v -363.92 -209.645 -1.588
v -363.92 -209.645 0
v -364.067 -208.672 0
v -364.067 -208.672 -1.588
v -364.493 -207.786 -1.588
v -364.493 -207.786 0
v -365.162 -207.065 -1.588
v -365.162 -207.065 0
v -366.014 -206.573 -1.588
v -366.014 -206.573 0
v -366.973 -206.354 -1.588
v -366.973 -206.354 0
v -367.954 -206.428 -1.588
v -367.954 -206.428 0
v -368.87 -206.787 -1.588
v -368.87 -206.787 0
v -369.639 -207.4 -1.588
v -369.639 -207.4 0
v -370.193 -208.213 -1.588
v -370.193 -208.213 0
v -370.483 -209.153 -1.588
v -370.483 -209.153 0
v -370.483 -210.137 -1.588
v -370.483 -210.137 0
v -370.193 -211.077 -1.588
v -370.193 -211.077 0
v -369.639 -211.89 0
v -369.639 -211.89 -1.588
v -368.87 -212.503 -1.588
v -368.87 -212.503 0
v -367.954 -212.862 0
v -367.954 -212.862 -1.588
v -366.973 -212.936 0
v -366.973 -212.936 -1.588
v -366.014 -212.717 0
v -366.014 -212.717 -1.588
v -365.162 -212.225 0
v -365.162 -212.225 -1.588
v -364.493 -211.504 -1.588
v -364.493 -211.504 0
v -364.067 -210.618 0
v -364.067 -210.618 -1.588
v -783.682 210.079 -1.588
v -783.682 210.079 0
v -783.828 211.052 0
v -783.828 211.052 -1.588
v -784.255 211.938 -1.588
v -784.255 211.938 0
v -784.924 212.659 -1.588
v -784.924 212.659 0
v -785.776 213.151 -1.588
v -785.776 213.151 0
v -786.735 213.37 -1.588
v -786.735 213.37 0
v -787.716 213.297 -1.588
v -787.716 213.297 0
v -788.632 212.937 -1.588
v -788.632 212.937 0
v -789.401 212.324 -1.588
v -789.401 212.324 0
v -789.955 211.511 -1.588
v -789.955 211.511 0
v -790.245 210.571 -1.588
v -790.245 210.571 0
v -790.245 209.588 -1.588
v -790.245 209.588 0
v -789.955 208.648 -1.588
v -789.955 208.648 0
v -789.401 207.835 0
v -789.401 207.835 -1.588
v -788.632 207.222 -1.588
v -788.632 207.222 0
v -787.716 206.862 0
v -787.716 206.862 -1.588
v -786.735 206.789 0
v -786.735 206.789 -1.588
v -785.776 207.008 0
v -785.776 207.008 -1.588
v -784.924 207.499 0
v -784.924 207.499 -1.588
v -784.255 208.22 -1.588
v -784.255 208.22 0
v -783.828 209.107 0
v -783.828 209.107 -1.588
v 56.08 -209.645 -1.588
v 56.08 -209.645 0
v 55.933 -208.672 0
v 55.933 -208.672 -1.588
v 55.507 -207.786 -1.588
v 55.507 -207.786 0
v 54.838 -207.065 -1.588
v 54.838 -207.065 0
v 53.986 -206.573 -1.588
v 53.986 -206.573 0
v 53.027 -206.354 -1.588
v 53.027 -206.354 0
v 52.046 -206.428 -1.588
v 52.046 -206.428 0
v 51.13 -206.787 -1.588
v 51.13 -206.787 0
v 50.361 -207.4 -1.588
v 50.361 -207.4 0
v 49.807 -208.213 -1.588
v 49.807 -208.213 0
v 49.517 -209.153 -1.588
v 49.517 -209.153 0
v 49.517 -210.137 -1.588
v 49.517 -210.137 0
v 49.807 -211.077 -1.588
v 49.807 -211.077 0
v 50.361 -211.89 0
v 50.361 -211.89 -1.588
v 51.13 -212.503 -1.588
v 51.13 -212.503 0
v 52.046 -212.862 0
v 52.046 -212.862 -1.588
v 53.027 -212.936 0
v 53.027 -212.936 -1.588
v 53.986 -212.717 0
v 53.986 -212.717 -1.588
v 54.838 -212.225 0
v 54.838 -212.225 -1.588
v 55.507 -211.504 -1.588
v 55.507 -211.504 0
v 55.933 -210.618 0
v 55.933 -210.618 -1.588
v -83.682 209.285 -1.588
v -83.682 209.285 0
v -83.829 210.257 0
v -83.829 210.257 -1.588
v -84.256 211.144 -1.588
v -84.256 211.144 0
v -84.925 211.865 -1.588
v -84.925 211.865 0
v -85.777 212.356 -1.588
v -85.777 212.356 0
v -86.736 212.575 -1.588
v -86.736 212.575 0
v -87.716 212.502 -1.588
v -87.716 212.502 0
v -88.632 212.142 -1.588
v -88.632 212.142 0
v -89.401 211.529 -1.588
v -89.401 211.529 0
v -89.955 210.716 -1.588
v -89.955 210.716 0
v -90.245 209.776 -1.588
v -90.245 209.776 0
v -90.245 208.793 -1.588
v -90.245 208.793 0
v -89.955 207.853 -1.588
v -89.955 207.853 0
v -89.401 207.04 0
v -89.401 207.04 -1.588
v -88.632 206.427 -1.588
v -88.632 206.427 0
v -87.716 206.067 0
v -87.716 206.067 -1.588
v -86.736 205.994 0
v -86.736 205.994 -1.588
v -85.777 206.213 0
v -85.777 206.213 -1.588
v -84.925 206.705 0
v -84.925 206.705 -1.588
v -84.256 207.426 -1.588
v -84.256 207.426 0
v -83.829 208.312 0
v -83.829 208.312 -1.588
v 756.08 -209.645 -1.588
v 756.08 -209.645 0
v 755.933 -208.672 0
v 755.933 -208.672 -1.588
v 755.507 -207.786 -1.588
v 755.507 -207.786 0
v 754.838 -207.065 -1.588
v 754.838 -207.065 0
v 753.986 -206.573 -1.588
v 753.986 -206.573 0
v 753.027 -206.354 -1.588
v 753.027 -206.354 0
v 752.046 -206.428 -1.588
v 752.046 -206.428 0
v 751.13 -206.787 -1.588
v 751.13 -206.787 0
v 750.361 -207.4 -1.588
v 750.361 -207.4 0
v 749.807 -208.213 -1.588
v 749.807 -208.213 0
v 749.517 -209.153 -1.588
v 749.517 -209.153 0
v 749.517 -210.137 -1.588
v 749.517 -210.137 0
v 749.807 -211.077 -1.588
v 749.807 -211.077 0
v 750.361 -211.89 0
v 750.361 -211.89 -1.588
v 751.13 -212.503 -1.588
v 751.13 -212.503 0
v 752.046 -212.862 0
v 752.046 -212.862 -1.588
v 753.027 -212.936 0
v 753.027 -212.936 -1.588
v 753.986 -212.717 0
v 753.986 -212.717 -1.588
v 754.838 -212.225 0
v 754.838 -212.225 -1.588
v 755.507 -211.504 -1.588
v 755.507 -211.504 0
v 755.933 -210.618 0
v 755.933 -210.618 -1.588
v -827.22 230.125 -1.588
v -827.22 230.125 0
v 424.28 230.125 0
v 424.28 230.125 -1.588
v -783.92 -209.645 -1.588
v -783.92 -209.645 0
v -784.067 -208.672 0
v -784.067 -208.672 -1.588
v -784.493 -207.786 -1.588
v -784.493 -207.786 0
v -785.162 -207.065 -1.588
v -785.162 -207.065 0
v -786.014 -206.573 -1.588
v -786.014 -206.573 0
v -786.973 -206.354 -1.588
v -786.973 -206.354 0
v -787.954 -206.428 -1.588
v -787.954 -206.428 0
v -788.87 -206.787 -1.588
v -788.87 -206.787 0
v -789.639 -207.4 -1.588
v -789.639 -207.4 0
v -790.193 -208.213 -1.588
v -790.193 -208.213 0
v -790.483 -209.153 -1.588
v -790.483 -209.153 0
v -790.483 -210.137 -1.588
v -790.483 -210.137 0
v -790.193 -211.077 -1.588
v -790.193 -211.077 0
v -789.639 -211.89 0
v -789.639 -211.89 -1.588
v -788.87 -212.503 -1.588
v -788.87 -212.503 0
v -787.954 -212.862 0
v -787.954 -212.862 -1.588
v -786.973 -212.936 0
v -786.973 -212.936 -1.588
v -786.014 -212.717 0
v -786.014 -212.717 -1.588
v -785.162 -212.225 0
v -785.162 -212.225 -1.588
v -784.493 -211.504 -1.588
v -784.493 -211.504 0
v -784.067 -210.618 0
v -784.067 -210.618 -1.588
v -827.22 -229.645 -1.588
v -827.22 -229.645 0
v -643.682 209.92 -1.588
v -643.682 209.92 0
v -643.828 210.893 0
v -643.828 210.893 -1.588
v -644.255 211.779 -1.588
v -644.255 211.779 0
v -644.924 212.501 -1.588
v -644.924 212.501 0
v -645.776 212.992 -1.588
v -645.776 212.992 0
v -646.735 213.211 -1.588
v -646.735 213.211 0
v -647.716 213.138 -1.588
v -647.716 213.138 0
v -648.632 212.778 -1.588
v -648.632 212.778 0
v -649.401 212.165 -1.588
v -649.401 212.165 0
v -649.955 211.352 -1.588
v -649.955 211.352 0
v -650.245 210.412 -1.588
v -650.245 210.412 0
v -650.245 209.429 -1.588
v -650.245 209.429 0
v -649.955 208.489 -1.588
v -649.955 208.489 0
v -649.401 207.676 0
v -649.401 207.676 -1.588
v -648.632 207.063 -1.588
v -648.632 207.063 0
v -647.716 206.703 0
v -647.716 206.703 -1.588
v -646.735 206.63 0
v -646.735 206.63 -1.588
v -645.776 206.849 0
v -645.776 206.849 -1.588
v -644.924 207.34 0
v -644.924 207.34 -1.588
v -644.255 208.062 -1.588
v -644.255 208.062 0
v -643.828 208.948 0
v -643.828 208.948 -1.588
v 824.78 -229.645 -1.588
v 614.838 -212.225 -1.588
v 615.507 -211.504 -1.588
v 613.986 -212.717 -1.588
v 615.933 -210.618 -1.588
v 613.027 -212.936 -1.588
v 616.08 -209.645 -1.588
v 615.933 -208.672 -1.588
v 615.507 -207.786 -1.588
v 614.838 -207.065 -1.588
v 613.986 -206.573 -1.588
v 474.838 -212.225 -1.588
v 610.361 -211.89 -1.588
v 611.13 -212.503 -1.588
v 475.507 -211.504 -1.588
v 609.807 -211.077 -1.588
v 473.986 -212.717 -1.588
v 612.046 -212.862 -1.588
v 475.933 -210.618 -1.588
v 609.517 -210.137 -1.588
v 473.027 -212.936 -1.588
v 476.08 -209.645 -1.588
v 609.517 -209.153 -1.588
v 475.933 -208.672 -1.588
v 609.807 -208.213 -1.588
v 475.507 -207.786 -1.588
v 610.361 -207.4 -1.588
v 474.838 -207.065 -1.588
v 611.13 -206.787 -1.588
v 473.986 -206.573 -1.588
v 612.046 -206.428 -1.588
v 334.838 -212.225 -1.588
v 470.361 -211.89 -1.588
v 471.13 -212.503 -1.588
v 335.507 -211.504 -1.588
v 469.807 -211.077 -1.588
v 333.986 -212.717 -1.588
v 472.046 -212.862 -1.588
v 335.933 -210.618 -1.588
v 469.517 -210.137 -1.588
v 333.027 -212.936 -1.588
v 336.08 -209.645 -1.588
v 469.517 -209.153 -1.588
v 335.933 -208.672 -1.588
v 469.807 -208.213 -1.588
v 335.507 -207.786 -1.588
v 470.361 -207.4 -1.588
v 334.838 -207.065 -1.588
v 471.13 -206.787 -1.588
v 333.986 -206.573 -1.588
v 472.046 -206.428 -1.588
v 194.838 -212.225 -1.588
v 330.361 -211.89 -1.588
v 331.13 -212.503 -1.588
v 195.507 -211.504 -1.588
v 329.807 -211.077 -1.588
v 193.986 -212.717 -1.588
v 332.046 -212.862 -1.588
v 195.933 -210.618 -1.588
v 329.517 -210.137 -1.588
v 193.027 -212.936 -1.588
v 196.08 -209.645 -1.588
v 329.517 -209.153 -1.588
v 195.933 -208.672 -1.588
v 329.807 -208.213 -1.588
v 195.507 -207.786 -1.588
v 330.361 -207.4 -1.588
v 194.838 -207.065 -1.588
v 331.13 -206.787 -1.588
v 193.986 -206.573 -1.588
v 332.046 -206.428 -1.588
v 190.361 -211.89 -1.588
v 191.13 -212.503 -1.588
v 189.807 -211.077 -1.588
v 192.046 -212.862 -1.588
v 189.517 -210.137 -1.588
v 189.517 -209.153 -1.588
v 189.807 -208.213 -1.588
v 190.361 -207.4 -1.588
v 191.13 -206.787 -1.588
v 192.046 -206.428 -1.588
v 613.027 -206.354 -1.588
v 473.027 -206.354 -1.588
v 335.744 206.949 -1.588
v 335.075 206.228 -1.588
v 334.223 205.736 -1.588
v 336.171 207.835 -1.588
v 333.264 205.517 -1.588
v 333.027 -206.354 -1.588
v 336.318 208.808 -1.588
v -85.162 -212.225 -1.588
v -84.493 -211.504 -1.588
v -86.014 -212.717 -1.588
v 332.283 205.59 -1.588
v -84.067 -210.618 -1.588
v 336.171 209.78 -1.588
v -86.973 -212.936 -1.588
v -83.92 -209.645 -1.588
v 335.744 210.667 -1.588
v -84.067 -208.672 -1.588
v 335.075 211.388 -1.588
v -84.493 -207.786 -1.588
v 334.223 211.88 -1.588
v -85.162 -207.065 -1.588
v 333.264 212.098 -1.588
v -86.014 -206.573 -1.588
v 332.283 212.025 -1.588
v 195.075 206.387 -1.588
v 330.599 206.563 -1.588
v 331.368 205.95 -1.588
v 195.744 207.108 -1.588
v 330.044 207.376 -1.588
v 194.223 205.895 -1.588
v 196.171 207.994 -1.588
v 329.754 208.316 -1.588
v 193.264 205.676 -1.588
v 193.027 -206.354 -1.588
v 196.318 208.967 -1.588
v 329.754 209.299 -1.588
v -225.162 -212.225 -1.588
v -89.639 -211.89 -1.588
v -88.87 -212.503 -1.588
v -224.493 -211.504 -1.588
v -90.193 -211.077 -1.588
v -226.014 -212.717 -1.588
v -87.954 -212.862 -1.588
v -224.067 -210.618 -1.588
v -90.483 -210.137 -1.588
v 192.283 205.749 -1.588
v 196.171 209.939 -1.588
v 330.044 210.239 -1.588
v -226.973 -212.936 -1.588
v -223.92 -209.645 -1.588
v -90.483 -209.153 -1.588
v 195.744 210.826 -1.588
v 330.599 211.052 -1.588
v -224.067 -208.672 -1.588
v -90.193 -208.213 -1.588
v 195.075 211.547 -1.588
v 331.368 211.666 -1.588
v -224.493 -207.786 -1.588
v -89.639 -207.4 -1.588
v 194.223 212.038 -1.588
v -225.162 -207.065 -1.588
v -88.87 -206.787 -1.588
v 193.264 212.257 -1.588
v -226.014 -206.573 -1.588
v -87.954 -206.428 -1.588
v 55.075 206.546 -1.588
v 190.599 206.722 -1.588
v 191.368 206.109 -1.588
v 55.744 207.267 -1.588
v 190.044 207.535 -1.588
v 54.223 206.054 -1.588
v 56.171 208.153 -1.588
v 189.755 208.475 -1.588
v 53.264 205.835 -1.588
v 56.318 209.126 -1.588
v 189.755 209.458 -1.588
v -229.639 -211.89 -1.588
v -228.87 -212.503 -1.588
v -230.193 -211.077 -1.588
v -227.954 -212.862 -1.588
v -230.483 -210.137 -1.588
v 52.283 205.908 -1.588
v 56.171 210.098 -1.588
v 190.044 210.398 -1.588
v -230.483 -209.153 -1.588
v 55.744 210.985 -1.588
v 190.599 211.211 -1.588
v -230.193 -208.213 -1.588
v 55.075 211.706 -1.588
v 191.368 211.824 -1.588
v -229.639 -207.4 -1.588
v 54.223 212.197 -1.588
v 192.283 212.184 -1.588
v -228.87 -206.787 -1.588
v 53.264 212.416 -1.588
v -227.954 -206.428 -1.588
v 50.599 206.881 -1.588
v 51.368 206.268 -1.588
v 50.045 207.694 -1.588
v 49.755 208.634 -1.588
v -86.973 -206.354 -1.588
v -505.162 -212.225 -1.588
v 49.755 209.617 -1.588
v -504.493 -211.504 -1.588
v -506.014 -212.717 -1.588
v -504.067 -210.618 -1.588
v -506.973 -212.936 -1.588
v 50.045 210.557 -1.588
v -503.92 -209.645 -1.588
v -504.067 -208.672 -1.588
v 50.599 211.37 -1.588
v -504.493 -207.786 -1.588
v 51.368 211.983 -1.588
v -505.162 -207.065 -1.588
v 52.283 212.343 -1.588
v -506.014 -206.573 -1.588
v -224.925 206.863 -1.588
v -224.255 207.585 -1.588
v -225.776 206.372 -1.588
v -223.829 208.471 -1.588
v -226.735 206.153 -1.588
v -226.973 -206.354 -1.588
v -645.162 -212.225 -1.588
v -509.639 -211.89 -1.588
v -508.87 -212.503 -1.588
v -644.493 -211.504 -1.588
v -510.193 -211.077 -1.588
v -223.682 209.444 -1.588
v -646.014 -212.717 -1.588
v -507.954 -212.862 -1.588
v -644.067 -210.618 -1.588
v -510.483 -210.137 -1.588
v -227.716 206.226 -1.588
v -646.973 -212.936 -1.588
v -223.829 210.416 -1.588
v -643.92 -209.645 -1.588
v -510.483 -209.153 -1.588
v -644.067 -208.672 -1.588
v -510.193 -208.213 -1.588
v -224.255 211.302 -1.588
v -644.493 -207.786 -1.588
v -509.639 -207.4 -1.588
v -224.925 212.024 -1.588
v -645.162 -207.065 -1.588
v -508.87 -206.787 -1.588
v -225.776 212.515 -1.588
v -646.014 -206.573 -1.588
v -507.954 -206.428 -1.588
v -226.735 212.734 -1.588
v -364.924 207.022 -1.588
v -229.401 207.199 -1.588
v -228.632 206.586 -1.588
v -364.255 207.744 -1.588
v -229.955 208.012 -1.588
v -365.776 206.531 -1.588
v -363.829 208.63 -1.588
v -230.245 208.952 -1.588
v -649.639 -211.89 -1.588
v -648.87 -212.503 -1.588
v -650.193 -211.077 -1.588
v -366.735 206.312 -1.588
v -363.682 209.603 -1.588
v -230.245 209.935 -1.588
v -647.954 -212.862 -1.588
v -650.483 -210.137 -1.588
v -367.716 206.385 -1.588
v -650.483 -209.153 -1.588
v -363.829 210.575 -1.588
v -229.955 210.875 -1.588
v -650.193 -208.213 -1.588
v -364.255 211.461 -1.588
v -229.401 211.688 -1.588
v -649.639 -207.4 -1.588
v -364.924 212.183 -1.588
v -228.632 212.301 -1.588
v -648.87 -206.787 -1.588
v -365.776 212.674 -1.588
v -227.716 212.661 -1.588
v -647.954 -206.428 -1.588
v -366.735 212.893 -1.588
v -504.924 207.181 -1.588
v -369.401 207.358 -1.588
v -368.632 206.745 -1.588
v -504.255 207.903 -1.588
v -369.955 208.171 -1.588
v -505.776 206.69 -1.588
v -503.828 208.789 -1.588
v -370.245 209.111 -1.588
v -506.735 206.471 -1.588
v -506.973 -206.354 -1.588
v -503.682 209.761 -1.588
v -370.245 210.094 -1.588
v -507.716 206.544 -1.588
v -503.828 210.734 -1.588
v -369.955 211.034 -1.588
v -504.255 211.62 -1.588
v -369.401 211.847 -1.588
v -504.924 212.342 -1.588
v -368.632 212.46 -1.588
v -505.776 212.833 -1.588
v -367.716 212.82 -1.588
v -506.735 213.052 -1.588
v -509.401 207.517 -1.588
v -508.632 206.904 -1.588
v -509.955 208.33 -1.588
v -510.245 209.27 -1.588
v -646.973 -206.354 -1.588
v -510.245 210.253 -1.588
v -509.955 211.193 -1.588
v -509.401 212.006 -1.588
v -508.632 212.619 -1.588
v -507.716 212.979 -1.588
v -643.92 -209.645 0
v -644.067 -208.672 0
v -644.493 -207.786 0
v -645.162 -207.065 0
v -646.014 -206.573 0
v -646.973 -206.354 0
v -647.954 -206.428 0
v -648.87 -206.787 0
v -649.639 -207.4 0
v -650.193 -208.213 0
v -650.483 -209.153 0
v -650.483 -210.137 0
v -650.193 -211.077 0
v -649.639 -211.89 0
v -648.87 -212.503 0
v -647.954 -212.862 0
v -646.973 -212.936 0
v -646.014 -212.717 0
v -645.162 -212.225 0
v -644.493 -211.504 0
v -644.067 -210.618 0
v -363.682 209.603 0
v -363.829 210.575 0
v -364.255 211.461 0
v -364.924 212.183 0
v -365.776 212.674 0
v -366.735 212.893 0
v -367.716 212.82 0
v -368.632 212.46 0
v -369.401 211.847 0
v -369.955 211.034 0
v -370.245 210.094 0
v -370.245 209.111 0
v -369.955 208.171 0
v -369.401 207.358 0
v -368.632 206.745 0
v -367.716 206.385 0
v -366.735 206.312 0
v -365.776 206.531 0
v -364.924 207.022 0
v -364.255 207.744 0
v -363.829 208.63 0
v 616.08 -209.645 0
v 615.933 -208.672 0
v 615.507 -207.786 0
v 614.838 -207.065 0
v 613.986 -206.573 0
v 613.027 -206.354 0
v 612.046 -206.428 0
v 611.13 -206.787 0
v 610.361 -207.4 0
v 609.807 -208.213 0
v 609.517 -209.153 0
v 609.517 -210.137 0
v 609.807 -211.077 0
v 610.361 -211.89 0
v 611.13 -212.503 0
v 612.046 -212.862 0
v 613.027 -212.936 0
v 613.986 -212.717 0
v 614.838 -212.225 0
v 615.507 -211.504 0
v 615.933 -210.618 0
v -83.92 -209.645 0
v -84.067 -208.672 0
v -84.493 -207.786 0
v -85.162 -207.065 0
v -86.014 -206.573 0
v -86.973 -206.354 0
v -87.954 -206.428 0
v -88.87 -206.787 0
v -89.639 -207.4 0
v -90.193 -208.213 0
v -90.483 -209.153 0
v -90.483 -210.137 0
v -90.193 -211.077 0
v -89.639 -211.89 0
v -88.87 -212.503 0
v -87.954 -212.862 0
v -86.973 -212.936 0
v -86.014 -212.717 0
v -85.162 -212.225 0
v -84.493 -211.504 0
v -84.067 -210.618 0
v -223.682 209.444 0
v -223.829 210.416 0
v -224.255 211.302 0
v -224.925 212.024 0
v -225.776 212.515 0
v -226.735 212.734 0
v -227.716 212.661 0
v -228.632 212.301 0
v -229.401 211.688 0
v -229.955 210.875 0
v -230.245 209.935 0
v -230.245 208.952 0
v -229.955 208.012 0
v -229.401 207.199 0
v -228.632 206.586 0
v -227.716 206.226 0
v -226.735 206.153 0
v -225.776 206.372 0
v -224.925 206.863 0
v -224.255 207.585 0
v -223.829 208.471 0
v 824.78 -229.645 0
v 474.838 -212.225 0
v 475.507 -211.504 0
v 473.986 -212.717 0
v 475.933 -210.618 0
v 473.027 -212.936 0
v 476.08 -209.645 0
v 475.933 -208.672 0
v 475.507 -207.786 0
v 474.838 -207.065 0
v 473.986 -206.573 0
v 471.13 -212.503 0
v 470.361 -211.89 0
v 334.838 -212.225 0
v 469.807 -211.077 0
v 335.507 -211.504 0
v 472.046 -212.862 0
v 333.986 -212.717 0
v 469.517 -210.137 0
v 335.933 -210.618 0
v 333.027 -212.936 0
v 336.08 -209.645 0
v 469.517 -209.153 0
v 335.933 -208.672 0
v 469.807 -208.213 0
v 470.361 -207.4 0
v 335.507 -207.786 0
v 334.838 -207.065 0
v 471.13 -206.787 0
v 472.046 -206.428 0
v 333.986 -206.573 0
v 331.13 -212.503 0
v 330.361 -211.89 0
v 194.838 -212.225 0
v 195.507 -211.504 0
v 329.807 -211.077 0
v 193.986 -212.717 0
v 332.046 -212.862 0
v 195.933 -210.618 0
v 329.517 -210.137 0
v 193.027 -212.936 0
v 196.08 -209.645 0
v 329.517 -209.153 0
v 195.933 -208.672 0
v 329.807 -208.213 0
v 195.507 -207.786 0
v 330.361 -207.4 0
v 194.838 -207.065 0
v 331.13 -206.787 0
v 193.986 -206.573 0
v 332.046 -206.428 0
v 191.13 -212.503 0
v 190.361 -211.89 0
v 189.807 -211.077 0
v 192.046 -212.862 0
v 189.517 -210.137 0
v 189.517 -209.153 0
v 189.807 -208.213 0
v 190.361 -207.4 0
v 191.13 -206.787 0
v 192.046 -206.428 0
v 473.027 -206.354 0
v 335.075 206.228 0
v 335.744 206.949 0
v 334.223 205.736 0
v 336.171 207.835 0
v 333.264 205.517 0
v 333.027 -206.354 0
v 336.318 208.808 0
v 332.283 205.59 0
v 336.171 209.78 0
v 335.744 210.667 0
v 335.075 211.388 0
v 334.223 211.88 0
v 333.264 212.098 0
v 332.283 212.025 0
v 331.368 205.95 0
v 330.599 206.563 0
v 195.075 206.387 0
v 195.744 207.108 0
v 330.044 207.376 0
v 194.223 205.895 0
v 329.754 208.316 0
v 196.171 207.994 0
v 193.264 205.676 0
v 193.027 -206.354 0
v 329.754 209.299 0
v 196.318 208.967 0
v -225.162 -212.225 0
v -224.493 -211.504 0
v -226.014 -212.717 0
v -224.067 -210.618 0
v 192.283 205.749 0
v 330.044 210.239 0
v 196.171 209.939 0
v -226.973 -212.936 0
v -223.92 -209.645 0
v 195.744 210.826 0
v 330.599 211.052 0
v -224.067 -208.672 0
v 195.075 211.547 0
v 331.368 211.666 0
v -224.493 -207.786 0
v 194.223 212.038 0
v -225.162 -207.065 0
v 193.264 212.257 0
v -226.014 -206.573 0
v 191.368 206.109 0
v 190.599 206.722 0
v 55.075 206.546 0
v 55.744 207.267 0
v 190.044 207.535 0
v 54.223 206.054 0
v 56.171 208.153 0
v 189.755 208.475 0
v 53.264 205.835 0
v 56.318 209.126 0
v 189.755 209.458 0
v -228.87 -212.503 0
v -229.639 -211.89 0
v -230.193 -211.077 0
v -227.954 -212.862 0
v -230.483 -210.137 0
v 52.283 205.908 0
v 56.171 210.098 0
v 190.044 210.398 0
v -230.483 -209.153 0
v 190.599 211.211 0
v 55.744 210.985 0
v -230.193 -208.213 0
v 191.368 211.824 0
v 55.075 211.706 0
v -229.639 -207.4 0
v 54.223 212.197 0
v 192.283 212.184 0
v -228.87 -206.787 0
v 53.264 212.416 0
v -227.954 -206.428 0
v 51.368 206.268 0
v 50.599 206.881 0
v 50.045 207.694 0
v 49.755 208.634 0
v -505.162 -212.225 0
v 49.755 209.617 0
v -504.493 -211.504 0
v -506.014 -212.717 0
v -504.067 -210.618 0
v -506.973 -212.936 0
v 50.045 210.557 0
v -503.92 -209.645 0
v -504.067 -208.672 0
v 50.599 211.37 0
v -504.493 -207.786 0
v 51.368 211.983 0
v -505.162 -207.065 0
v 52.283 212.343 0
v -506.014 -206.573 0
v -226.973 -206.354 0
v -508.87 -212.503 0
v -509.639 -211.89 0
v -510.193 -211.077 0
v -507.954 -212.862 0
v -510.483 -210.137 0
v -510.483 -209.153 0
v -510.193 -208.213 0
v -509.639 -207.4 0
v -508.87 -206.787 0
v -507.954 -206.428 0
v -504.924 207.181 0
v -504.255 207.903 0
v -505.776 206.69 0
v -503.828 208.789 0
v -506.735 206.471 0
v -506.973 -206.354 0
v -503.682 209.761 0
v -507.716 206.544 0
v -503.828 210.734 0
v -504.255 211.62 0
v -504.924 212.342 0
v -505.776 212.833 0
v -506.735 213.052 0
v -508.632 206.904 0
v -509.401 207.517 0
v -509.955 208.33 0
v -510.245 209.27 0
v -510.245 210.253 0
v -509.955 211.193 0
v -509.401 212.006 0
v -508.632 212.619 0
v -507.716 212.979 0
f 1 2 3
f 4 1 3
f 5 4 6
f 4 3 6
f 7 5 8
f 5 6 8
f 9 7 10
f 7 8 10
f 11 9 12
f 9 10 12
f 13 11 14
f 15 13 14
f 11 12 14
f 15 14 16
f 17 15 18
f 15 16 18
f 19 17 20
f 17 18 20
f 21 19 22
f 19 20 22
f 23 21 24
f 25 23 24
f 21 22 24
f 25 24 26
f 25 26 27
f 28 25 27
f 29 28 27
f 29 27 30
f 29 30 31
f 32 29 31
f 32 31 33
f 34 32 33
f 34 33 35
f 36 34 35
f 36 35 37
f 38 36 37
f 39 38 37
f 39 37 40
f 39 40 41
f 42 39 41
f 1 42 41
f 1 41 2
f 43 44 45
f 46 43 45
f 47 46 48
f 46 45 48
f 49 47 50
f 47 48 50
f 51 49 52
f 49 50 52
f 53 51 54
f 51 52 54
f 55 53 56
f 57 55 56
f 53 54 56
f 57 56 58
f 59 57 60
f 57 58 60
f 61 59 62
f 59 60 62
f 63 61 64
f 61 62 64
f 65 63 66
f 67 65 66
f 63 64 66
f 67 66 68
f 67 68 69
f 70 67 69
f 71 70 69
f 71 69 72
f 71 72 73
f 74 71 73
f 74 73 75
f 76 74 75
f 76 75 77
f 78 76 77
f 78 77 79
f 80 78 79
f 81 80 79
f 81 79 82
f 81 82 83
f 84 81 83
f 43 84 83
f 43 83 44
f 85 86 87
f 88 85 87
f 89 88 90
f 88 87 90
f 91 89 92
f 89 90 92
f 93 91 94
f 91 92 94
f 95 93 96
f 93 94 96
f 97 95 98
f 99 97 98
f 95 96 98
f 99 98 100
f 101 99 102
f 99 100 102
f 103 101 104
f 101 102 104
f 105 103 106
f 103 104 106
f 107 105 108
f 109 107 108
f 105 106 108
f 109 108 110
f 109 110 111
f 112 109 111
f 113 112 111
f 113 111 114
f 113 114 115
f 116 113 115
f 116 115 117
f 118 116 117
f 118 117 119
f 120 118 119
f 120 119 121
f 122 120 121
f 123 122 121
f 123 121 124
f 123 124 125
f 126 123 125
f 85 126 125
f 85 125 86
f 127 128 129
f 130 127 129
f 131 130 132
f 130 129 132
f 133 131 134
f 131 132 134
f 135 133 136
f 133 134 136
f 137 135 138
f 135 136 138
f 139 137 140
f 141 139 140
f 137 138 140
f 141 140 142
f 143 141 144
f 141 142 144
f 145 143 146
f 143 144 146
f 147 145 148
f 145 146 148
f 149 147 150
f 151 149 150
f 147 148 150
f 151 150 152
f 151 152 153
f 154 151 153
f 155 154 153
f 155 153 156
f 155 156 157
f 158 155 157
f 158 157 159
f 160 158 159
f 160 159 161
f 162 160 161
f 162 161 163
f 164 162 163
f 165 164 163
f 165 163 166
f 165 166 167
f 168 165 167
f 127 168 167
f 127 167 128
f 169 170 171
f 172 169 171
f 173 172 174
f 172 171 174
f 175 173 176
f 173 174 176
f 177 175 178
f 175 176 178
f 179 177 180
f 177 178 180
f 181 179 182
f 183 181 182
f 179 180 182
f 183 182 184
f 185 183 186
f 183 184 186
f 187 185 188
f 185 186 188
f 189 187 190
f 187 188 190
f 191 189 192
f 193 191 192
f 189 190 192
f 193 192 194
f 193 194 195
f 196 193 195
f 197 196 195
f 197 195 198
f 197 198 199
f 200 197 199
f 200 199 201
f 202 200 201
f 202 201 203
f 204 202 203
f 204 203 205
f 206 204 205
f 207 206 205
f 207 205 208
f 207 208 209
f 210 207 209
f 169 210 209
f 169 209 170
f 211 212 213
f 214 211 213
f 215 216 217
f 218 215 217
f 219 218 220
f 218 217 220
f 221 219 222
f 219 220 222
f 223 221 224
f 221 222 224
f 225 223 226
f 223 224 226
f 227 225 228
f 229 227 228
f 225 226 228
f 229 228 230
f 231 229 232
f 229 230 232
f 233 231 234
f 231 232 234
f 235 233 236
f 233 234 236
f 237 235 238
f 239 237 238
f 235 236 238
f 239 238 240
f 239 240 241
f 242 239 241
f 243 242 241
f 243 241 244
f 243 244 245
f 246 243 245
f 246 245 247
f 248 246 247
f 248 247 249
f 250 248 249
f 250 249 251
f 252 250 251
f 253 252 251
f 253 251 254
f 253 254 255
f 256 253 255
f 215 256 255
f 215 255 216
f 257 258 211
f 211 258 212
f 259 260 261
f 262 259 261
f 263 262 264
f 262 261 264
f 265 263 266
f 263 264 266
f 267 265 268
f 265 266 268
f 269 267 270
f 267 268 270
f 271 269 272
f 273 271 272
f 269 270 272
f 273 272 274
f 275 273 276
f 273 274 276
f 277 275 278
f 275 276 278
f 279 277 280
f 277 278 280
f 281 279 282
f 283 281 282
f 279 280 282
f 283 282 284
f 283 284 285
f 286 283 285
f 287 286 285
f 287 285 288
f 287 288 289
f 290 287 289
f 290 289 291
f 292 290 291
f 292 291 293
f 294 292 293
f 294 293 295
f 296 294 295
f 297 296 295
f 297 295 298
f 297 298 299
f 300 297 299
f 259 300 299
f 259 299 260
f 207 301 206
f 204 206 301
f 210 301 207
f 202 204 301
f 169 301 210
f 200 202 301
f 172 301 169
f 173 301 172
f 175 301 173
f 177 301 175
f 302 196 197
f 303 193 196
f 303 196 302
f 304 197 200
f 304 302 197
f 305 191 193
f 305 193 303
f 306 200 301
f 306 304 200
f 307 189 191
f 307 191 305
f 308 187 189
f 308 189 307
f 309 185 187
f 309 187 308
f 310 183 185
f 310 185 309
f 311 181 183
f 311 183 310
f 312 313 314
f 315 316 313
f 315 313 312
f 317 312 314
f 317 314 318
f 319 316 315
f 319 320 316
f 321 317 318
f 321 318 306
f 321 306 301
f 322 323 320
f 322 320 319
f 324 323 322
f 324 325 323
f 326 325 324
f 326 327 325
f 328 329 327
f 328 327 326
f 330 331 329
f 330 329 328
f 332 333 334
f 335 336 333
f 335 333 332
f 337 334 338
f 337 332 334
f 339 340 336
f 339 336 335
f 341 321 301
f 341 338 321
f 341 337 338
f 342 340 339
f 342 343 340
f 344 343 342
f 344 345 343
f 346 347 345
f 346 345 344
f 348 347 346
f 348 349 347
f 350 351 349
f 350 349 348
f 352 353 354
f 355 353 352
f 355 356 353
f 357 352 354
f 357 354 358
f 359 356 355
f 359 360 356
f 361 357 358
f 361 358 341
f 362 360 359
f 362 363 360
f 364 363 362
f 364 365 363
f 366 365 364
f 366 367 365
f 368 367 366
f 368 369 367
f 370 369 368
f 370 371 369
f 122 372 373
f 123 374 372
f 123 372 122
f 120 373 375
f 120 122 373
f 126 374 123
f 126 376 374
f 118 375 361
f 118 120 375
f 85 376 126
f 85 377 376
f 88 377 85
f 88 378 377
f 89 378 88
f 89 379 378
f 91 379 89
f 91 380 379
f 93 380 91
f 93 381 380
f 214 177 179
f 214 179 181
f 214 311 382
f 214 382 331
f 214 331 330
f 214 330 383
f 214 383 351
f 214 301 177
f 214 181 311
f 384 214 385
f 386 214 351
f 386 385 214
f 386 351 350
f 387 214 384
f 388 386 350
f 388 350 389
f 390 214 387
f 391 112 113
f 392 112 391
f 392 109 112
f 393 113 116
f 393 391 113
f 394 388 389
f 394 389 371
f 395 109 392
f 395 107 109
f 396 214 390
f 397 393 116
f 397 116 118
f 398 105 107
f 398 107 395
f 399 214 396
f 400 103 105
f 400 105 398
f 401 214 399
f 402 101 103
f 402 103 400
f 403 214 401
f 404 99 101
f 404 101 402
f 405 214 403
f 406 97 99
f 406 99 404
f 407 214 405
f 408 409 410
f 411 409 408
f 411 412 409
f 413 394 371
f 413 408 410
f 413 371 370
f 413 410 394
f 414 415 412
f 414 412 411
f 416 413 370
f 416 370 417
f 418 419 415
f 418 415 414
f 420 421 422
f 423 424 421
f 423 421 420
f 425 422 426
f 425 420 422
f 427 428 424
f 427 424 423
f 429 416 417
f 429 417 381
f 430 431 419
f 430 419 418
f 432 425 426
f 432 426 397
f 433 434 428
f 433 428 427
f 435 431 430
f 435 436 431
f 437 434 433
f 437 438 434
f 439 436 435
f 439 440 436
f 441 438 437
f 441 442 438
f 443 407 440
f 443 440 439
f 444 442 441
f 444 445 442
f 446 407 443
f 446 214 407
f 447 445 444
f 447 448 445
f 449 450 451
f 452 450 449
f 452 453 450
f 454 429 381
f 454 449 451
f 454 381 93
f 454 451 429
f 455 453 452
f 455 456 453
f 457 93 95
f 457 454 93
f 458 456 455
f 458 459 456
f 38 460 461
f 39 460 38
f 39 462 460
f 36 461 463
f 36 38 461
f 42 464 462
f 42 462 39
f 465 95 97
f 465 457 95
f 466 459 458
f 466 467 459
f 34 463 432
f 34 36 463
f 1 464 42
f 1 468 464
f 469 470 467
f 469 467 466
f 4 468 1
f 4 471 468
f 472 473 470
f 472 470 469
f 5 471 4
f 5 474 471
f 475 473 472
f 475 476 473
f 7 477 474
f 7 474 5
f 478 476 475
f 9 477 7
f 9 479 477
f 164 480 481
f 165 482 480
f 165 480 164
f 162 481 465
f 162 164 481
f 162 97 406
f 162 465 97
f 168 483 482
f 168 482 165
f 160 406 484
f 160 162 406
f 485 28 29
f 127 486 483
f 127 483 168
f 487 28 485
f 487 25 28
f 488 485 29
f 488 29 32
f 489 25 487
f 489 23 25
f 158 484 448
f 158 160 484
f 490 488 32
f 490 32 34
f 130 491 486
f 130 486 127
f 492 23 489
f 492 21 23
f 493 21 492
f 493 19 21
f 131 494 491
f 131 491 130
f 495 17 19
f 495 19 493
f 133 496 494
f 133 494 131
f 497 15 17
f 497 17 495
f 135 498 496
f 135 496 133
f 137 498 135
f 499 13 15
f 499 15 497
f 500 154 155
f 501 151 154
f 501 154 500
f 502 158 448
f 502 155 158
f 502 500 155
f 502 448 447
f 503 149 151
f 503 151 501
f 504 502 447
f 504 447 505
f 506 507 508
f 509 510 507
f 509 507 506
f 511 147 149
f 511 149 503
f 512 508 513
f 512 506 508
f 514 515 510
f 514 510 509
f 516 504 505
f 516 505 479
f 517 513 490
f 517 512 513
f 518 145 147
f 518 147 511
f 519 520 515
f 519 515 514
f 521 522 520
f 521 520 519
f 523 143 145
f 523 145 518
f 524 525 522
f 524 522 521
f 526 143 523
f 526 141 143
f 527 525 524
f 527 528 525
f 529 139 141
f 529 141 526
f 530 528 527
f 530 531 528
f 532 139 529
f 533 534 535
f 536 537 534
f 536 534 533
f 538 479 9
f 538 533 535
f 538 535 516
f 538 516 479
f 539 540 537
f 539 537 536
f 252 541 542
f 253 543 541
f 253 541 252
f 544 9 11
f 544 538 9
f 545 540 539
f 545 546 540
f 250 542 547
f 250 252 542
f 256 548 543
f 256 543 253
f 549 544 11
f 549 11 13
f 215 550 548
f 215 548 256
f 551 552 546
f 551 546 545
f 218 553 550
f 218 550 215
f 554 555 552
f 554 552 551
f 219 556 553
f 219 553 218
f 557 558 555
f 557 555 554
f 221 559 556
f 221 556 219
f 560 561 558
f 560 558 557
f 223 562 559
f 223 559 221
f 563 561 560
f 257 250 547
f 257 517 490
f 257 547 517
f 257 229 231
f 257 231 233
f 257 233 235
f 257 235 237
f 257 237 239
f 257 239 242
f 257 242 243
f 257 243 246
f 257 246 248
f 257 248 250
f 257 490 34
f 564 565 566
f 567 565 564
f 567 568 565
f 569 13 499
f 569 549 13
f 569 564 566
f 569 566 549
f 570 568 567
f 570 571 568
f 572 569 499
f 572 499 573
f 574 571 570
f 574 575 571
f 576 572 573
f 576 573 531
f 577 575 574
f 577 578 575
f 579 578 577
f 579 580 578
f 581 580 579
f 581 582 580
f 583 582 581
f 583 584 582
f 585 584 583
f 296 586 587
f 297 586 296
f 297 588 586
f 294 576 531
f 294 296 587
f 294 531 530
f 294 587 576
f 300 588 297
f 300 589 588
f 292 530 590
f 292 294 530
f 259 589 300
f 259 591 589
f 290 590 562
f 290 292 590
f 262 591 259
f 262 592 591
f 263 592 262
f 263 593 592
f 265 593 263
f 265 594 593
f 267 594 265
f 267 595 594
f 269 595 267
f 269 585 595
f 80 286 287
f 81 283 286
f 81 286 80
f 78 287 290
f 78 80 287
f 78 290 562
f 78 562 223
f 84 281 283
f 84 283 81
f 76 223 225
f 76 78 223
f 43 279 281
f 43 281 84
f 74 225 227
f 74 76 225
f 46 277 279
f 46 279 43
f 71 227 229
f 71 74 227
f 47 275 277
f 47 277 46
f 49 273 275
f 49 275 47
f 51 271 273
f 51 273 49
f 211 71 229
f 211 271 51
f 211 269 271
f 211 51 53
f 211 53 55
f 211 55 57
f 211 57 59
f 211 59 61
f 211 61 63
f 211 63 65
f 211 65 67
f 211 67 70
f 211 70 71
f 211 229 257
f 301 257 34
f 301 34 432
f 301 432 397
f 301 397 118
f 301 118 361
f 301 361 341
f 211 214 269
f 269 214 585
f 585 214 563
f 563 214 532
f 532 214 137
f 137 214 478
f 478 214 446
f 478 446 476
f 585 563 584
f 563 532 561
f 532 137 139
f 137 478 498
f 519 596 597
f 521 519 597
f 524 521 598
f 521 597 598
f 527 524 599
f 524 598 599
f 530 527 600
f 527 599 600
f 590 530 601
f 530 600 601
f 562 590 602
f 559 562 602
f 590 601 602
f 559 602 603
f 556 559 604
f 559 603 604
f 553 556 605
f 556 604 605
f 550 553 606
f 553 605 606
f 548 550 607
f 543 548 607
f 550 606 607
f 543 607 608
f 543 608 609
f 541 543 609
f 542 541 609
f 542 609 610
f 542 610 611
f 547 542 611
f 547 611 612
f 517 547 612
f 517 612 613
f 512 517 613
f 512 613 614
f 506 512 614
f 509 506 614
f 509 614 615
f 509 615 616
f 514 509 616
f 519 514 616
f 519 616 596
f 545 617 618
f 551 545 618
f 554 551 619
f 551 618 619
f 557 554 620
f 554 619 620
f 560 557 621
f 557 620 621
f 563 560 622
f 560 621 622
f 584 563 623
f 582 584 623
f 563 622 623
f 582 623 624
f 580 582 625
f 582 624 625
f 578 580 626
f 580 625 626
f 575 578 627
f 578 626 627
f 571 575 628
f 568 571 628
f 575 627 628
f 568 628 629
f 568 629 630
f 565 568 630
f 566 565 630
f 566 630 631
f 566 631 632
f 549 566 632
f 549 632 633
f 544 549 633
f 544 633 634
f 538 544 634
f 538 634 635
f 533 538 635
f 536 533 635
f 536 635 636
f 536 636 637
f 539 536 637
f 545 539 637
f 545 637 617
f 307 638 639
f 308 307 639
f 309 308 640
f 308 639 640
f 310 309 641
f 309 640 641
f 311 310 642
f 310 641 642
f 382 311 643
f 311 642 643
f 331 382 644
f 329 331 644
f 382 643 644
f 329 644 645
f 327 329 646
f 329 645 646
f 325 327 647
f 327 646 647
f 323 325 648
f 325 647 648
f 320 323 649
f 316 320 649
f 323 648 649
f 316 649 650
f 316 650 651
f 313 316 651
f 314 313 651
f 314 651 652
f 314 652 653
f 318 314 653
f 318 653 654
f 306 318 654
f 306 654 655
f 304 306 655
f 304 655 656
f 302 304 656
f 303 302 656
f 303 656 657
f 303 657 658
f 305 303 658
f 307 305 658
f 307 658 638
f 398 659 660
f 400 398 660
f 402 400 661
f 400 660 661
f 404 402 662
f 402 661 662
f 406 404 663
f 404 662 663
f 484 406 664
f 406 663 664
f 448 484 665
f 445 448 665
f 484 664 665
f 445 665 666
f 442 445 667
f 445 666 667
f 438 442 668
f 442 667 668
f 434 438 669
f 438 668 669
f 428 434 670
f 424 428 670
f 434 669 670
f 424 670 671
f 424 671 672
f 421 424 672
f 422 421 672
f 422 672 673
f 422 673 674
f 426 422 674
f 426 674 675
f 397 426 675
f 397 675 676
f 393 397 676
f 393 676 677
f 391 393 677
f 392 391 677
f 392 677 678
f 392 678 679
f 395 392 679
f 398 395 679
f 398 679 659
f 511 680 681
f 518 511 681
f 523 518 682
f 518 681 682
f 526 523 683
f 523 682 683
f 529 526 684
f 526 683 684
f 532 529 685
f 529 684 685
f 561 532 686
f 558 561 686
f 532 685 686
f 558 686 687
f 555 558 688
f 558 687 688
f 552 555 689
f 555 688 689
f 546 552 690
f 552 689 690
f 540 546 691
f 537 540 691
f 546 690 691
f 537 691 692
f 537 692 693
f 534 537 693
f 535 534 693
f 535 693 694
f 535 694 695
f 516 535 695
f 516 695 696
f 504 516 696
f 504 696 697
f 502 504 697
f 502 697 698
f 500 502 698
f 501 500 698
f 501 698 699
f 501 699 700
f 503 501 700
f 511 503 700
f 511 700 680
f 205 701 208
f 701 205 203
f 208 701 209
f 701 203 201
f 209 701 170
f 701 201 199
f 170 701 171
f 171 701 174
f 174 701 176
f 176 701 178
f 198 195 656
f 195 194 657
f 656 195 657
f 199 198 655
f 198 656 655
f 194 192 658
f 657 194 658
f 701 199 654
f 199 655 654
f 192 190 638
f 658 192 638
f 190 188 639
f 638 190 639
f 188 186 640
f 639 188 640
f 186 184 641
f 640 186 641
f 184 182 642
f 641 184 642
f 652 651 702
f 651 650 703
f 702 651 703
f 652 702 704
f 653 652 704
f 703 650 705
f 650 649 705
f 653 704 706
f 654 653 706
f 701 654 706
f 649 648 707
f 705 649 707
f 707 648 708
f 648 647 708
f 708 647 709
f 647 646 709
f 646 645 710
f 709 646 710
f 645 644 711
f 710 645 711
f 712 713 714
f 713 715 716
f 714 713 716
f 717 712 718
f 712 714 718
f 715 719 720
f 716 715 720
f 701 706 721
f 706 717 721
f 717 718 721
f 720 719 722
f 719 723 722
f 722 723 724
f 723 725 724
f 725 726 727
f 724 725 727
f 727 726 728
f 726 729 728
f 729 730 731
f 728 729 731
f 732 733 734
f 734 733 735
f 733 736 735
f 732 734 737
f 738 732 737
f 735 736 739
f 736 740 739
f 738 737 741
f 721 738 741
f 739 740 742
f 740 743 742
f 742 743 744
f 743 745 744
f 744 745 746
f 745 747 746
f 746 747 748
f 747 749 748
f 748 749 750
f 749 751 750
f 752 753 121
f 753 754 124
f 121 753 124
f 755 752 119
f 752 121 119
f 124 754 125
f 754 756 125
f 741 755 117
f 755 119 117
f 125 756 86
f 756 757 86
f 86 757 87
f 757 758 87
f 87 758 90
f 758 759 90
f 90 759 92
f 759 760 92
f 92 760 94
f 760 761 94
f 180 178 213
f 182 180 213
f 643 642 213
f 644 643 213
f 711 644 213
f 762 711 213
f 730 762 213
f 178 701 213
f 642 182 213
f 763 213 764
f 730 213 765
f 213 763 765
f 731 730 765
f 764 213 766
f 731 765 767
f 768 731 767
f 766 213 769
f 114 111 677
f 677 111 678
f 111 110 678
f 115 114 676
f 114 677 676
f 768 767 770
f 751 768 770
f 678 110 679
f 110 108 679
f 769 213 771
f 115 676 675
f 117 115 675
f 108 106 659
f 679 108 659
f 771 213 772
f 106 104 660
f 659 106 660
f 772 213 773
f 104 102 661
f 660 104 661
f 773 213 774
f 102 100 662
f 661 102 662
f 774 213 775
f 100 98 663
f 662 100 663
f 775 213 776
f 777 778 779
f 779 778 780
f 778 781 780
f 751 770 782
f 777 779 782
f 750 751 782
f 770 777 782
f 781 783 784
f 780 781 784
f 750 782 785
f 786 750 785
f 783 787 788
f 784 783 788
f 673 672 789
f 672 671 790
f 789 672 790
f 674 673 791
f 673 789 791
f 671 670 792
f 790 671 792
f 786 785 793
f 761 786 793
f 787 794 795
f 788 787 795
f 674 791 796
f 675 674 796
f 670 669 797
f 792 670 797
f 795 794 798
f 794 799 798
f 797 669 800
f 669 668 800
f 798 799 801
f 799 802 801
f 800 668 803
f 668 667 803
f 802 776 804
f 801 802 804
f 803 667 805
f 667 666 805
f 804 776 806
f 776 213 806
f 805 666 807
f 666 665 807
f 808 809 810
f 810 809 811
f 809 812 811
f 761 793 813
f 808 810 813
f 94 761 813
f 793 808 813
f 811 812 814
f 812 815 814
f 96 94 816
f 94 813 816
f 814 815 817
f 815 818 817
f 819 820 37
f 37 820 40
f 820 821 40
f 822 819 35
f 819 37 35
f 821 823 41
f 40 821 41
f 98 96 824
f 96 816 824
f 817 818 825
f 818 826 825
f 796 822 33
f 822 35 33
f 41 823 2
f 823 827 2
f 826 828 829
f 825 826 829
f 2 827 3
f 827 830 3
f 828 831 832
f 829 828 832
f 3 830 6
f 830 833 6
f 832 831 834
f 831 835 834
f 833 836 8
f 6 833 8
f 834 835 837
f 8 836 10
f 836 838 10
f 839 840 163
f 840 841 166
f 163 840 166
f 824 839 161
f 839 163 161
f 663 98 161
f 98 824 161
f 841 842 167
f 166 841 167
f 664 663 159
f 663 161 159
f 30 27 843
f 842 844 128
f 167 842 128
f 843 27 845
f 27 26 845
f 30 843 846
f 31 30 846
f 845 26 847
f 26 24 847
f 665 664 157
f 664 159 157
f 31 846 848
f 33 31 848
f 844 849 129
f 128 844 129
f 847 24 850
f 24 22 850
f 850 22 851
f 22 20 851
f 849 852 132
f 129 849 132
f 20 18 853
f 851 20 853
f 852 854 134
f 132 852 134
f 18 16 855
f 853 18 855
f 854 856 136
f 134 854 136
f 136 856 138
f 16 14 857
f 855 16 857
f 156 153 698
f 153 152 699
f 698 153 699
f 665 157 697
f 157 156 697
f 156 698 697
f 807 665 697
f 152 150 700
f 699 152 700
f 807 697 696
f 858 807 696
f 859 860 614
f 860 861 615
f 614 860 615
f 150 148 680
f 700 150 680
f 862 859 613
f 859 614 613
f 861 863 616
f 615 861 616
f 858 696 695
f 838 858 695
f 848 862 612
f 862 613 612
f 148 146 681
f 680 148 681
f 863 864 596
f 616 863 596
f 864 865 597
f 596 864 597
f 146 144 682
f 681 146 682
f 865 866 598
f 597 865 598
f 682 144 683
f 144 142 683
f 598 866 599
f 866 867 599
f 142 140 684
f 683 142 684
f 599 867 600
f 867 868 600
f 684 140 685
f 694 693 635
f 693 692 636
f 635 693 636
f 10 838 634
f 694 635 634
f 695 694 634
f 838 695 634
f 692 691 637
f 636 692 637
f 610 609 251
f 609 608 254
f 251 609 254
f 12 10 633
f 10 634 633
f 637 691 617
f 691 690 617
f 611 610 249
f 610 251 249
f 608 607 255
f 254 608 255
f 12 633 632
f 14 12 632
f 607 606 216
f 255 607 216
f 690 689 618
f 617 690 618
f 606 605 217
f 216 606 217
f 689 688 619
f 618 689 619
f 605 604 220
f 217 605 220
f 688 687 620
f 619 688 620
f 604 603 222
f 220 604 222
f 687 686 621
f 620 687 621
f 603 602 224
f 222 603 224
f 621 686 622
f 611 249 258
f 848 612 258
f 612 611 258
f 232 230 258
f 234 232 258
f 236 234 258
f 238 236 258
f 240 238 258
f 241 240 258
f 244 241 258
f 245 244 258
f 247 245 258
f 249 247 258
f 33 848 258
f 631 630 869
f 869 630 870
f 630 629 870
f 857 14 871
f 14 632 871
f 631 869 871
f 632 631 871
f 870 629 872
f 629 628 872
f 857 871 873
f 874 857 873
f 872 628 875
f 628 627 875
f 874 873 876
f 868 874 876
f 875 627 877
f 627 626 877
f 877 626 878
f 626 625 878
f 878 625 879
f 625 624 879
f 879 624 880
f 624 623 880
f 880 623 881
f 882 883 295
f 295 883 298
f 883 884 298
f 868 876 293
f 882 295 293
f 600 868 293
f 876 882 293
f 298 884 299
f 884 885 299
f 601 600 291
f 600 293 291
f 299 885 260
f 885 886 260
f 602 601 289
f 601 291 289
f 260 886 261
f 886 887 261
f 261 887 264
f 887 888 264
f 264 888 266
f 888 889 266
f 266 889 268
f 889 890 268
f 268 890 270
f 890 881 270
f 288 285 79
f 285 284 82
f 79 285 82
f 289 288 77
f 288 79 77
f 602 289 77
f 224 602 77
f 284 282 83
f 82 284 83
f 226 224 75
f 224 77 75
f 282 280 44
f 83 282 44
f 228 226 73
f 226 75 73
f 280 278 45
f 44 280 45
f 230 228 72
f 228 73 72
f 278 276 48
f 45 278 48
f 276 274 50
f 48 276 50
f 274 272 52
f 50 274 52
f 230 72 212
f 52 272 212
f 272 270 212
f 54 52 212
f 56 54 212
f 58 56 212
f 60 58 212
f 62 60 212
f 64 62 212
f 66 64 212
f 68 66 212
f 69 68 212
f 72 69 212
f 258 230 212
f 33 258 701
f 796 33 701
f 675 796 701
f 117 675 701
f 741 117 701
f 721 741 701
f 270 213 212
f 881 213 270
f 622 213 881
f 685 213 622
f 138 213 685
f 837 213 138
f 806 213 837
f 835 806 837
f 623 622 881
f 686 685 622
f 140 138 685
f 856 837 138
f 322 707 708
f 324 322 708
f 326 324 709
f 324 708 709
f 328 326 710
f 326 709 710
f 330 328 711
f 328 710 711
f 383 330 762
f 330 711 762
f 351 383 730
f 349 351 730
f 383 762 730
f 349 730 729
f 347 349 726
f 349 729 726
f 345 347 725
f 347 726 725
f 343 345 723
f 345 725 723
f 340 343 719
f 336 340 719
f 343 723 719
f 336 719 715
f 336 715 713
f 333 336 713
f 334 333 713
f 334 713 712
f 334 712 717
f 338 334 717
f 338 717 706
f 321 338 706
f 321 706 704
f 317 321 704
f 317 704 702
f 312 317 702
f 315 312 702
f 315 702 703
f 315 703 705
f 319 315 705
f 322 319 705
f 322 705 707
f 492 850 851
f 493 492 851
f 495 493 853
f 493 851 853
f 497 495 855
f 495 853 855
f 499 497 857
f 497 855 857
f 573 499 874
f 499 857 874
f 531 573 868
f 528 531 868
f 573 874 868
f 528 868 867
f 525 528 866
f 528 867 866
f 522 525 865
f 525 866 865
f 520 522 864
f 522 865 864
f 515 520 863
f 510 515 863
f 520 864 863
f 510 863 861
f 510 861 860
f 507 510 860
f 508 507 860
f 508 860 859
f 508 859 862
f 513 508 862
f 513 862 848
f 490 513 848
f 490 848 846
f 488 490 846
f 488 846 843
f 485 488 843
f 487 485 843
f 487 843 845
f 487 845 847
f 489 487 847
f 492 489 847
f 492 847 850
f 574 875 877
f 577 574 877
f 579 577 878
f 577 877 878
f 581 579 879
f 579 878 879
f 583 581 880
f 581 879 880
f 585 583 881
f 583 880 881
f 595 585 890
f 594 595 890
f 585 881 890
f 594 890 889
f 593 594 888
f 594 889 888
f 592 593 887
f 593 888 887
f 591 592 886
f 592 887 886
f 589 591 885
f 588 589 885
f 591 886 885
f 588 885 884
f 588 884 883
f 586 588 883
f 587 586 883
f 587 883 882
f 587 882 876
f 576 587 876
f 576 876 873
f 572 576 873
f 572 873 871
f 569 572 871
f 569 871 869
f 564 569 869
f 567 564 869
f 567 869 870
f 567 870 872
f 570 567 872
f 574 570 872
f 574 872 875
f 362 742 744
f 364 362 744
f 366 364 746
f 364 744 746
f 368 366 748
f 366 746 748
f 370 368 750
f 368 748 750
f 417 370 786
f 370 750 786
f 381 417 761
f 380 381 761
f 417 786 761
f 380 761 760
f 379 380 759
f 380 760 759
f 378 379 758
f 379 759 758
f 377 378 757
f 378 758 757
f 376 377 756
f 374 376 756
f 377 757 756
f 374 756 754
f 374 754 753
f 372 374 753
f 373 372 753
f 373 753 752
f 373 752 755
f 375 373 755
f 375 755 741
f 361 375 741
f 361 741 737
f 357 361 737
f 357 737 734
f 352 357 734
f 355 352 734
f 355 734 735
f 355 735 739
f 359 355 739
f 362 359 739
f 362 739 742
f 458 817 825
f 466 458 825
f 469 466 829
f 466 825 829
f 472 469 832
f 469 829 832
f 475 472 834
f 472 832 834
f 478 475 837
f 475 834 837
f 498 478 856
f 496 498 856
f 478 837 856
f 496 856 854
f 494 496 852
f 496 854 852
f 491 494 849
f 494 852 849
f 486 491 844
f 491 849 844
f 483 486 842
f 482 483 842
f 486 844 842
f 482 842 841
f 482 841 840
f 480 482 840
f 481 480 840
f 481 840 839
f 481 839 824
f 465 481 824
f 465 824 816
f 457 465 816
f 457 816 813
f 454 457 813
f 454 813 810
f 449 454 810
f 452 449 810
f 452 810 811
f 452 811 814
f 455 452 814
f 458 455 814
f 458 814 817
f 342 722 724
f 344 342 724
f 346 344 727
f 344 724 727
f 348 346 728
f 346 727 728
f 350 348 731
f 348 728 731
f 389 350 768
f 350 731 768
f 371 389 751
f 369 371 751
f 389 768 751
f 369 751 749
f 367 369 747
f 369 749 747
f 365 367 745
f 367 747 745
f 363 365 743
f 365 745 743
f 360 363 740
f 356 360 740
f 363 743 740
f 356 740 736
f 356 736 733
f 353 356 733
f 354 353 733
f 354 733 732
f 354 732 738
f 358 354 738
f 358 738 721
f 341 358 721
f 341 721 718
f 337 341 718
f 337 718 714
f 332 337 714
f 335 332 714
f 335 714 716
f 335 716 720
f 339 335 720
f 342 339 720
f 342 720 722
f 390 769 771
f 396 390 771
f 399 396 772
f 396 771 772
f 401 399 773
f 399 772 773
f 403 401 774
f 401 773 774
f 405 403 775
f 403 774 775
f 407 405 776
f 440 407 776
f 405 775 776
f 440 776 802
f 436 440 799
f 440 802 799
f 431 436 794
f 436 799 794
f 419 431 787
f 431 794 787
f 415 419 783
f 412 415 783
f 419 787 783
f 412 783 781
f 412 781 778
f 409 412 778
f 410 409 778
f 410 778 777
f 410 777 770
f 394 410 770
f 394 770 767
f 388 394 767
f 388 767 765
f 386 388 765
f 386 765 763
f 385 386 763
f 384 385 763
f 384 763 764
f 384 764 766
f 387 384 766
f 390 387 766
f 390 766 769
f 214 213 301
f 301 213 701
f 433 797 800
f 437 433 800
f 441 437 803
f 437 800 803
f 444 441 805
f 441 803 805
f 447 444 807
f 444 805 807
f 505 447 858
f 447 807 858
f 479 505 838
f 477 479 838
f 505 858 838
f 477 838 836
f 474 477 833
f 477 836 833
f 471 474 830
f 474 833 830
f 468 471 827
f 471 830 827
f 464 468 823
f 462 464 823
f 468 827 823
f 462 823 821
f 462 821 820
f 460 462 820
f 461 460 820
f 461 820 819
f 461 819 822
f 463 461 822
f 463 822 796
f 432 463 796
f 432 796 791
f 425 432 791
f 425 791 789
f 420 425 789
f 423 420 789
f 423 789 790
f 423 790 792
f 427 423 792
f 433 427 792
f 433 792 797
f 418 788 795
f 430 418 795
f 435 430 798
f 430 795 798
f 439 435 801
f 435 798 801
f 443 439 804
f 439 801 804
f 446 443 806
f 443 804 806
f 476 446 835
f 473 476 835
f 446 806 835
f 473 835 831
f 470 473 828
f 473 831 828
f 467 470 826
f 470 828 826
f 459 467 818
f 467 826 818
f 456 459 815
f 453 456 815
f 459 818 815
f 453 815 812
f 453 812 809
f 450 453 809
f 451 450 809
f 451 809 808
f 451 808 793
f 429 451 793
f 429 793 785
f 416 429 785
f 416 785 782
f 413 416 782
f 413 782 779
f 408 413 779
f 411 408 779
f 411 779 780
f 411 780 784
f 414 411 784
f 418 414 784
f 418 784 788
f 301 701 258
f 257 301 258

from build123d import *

# Parameters (mm, degrees)
BRIDA_BASE1_DEPTH            = 1.5875
TALADRO_DE_MARGEN_PARA_M62_D = 6.6


# Sheet-metal steps are written as plain solids
with BuildPart() as part:
    # Croquis1 → Brida base1 (new body)
    with BuildSketch(Plane.XY):
        Polygon((424.28, 230.125), (824.78, -229.645), (-827.22, -229.645), (-827.22, 230.125), align=None)
    extrude(amount=-BRIDA_BASE1_DEPTH)

    # Taladro de margen para M62 (through all)
    with Locations(Plane(origin=(0, 0, -1.5875), x_dir=(-1, 0, 0), z_dir=(0, 0, -1))):
        with Locations((787.22, -209.645), (647.22, -209.645), (507.22, -209.645), (367.22, -209.645), (227.22, -209.645), (87.22, -209.645), (-52.78, -209.645), (-192.78, -209.645), (-332.78, -209.645), (-472.78, -209.645), (-612.78, -209.645), (-752.78, -209.645), (-753.017315716, 208.330699563), (-613.017405979, 208.489676218), (-473.017496241, 208.648652874), (-333.017586504, 208.80762953), (-193.017676767, 208.966606186), (-53.01776703, 209.125582842), (86.982142707, 209.284559498), (226.982052445, 209.443536154), (366.981962182, 209.60251281), (506.981871919, 209.761489466), (646.981781656, 209.920466122), (786.981691393, 210.079442778)):
            Hole(TALADRO_DE_MARGEN_PARA_M62_D / 2)


solid = part.part
